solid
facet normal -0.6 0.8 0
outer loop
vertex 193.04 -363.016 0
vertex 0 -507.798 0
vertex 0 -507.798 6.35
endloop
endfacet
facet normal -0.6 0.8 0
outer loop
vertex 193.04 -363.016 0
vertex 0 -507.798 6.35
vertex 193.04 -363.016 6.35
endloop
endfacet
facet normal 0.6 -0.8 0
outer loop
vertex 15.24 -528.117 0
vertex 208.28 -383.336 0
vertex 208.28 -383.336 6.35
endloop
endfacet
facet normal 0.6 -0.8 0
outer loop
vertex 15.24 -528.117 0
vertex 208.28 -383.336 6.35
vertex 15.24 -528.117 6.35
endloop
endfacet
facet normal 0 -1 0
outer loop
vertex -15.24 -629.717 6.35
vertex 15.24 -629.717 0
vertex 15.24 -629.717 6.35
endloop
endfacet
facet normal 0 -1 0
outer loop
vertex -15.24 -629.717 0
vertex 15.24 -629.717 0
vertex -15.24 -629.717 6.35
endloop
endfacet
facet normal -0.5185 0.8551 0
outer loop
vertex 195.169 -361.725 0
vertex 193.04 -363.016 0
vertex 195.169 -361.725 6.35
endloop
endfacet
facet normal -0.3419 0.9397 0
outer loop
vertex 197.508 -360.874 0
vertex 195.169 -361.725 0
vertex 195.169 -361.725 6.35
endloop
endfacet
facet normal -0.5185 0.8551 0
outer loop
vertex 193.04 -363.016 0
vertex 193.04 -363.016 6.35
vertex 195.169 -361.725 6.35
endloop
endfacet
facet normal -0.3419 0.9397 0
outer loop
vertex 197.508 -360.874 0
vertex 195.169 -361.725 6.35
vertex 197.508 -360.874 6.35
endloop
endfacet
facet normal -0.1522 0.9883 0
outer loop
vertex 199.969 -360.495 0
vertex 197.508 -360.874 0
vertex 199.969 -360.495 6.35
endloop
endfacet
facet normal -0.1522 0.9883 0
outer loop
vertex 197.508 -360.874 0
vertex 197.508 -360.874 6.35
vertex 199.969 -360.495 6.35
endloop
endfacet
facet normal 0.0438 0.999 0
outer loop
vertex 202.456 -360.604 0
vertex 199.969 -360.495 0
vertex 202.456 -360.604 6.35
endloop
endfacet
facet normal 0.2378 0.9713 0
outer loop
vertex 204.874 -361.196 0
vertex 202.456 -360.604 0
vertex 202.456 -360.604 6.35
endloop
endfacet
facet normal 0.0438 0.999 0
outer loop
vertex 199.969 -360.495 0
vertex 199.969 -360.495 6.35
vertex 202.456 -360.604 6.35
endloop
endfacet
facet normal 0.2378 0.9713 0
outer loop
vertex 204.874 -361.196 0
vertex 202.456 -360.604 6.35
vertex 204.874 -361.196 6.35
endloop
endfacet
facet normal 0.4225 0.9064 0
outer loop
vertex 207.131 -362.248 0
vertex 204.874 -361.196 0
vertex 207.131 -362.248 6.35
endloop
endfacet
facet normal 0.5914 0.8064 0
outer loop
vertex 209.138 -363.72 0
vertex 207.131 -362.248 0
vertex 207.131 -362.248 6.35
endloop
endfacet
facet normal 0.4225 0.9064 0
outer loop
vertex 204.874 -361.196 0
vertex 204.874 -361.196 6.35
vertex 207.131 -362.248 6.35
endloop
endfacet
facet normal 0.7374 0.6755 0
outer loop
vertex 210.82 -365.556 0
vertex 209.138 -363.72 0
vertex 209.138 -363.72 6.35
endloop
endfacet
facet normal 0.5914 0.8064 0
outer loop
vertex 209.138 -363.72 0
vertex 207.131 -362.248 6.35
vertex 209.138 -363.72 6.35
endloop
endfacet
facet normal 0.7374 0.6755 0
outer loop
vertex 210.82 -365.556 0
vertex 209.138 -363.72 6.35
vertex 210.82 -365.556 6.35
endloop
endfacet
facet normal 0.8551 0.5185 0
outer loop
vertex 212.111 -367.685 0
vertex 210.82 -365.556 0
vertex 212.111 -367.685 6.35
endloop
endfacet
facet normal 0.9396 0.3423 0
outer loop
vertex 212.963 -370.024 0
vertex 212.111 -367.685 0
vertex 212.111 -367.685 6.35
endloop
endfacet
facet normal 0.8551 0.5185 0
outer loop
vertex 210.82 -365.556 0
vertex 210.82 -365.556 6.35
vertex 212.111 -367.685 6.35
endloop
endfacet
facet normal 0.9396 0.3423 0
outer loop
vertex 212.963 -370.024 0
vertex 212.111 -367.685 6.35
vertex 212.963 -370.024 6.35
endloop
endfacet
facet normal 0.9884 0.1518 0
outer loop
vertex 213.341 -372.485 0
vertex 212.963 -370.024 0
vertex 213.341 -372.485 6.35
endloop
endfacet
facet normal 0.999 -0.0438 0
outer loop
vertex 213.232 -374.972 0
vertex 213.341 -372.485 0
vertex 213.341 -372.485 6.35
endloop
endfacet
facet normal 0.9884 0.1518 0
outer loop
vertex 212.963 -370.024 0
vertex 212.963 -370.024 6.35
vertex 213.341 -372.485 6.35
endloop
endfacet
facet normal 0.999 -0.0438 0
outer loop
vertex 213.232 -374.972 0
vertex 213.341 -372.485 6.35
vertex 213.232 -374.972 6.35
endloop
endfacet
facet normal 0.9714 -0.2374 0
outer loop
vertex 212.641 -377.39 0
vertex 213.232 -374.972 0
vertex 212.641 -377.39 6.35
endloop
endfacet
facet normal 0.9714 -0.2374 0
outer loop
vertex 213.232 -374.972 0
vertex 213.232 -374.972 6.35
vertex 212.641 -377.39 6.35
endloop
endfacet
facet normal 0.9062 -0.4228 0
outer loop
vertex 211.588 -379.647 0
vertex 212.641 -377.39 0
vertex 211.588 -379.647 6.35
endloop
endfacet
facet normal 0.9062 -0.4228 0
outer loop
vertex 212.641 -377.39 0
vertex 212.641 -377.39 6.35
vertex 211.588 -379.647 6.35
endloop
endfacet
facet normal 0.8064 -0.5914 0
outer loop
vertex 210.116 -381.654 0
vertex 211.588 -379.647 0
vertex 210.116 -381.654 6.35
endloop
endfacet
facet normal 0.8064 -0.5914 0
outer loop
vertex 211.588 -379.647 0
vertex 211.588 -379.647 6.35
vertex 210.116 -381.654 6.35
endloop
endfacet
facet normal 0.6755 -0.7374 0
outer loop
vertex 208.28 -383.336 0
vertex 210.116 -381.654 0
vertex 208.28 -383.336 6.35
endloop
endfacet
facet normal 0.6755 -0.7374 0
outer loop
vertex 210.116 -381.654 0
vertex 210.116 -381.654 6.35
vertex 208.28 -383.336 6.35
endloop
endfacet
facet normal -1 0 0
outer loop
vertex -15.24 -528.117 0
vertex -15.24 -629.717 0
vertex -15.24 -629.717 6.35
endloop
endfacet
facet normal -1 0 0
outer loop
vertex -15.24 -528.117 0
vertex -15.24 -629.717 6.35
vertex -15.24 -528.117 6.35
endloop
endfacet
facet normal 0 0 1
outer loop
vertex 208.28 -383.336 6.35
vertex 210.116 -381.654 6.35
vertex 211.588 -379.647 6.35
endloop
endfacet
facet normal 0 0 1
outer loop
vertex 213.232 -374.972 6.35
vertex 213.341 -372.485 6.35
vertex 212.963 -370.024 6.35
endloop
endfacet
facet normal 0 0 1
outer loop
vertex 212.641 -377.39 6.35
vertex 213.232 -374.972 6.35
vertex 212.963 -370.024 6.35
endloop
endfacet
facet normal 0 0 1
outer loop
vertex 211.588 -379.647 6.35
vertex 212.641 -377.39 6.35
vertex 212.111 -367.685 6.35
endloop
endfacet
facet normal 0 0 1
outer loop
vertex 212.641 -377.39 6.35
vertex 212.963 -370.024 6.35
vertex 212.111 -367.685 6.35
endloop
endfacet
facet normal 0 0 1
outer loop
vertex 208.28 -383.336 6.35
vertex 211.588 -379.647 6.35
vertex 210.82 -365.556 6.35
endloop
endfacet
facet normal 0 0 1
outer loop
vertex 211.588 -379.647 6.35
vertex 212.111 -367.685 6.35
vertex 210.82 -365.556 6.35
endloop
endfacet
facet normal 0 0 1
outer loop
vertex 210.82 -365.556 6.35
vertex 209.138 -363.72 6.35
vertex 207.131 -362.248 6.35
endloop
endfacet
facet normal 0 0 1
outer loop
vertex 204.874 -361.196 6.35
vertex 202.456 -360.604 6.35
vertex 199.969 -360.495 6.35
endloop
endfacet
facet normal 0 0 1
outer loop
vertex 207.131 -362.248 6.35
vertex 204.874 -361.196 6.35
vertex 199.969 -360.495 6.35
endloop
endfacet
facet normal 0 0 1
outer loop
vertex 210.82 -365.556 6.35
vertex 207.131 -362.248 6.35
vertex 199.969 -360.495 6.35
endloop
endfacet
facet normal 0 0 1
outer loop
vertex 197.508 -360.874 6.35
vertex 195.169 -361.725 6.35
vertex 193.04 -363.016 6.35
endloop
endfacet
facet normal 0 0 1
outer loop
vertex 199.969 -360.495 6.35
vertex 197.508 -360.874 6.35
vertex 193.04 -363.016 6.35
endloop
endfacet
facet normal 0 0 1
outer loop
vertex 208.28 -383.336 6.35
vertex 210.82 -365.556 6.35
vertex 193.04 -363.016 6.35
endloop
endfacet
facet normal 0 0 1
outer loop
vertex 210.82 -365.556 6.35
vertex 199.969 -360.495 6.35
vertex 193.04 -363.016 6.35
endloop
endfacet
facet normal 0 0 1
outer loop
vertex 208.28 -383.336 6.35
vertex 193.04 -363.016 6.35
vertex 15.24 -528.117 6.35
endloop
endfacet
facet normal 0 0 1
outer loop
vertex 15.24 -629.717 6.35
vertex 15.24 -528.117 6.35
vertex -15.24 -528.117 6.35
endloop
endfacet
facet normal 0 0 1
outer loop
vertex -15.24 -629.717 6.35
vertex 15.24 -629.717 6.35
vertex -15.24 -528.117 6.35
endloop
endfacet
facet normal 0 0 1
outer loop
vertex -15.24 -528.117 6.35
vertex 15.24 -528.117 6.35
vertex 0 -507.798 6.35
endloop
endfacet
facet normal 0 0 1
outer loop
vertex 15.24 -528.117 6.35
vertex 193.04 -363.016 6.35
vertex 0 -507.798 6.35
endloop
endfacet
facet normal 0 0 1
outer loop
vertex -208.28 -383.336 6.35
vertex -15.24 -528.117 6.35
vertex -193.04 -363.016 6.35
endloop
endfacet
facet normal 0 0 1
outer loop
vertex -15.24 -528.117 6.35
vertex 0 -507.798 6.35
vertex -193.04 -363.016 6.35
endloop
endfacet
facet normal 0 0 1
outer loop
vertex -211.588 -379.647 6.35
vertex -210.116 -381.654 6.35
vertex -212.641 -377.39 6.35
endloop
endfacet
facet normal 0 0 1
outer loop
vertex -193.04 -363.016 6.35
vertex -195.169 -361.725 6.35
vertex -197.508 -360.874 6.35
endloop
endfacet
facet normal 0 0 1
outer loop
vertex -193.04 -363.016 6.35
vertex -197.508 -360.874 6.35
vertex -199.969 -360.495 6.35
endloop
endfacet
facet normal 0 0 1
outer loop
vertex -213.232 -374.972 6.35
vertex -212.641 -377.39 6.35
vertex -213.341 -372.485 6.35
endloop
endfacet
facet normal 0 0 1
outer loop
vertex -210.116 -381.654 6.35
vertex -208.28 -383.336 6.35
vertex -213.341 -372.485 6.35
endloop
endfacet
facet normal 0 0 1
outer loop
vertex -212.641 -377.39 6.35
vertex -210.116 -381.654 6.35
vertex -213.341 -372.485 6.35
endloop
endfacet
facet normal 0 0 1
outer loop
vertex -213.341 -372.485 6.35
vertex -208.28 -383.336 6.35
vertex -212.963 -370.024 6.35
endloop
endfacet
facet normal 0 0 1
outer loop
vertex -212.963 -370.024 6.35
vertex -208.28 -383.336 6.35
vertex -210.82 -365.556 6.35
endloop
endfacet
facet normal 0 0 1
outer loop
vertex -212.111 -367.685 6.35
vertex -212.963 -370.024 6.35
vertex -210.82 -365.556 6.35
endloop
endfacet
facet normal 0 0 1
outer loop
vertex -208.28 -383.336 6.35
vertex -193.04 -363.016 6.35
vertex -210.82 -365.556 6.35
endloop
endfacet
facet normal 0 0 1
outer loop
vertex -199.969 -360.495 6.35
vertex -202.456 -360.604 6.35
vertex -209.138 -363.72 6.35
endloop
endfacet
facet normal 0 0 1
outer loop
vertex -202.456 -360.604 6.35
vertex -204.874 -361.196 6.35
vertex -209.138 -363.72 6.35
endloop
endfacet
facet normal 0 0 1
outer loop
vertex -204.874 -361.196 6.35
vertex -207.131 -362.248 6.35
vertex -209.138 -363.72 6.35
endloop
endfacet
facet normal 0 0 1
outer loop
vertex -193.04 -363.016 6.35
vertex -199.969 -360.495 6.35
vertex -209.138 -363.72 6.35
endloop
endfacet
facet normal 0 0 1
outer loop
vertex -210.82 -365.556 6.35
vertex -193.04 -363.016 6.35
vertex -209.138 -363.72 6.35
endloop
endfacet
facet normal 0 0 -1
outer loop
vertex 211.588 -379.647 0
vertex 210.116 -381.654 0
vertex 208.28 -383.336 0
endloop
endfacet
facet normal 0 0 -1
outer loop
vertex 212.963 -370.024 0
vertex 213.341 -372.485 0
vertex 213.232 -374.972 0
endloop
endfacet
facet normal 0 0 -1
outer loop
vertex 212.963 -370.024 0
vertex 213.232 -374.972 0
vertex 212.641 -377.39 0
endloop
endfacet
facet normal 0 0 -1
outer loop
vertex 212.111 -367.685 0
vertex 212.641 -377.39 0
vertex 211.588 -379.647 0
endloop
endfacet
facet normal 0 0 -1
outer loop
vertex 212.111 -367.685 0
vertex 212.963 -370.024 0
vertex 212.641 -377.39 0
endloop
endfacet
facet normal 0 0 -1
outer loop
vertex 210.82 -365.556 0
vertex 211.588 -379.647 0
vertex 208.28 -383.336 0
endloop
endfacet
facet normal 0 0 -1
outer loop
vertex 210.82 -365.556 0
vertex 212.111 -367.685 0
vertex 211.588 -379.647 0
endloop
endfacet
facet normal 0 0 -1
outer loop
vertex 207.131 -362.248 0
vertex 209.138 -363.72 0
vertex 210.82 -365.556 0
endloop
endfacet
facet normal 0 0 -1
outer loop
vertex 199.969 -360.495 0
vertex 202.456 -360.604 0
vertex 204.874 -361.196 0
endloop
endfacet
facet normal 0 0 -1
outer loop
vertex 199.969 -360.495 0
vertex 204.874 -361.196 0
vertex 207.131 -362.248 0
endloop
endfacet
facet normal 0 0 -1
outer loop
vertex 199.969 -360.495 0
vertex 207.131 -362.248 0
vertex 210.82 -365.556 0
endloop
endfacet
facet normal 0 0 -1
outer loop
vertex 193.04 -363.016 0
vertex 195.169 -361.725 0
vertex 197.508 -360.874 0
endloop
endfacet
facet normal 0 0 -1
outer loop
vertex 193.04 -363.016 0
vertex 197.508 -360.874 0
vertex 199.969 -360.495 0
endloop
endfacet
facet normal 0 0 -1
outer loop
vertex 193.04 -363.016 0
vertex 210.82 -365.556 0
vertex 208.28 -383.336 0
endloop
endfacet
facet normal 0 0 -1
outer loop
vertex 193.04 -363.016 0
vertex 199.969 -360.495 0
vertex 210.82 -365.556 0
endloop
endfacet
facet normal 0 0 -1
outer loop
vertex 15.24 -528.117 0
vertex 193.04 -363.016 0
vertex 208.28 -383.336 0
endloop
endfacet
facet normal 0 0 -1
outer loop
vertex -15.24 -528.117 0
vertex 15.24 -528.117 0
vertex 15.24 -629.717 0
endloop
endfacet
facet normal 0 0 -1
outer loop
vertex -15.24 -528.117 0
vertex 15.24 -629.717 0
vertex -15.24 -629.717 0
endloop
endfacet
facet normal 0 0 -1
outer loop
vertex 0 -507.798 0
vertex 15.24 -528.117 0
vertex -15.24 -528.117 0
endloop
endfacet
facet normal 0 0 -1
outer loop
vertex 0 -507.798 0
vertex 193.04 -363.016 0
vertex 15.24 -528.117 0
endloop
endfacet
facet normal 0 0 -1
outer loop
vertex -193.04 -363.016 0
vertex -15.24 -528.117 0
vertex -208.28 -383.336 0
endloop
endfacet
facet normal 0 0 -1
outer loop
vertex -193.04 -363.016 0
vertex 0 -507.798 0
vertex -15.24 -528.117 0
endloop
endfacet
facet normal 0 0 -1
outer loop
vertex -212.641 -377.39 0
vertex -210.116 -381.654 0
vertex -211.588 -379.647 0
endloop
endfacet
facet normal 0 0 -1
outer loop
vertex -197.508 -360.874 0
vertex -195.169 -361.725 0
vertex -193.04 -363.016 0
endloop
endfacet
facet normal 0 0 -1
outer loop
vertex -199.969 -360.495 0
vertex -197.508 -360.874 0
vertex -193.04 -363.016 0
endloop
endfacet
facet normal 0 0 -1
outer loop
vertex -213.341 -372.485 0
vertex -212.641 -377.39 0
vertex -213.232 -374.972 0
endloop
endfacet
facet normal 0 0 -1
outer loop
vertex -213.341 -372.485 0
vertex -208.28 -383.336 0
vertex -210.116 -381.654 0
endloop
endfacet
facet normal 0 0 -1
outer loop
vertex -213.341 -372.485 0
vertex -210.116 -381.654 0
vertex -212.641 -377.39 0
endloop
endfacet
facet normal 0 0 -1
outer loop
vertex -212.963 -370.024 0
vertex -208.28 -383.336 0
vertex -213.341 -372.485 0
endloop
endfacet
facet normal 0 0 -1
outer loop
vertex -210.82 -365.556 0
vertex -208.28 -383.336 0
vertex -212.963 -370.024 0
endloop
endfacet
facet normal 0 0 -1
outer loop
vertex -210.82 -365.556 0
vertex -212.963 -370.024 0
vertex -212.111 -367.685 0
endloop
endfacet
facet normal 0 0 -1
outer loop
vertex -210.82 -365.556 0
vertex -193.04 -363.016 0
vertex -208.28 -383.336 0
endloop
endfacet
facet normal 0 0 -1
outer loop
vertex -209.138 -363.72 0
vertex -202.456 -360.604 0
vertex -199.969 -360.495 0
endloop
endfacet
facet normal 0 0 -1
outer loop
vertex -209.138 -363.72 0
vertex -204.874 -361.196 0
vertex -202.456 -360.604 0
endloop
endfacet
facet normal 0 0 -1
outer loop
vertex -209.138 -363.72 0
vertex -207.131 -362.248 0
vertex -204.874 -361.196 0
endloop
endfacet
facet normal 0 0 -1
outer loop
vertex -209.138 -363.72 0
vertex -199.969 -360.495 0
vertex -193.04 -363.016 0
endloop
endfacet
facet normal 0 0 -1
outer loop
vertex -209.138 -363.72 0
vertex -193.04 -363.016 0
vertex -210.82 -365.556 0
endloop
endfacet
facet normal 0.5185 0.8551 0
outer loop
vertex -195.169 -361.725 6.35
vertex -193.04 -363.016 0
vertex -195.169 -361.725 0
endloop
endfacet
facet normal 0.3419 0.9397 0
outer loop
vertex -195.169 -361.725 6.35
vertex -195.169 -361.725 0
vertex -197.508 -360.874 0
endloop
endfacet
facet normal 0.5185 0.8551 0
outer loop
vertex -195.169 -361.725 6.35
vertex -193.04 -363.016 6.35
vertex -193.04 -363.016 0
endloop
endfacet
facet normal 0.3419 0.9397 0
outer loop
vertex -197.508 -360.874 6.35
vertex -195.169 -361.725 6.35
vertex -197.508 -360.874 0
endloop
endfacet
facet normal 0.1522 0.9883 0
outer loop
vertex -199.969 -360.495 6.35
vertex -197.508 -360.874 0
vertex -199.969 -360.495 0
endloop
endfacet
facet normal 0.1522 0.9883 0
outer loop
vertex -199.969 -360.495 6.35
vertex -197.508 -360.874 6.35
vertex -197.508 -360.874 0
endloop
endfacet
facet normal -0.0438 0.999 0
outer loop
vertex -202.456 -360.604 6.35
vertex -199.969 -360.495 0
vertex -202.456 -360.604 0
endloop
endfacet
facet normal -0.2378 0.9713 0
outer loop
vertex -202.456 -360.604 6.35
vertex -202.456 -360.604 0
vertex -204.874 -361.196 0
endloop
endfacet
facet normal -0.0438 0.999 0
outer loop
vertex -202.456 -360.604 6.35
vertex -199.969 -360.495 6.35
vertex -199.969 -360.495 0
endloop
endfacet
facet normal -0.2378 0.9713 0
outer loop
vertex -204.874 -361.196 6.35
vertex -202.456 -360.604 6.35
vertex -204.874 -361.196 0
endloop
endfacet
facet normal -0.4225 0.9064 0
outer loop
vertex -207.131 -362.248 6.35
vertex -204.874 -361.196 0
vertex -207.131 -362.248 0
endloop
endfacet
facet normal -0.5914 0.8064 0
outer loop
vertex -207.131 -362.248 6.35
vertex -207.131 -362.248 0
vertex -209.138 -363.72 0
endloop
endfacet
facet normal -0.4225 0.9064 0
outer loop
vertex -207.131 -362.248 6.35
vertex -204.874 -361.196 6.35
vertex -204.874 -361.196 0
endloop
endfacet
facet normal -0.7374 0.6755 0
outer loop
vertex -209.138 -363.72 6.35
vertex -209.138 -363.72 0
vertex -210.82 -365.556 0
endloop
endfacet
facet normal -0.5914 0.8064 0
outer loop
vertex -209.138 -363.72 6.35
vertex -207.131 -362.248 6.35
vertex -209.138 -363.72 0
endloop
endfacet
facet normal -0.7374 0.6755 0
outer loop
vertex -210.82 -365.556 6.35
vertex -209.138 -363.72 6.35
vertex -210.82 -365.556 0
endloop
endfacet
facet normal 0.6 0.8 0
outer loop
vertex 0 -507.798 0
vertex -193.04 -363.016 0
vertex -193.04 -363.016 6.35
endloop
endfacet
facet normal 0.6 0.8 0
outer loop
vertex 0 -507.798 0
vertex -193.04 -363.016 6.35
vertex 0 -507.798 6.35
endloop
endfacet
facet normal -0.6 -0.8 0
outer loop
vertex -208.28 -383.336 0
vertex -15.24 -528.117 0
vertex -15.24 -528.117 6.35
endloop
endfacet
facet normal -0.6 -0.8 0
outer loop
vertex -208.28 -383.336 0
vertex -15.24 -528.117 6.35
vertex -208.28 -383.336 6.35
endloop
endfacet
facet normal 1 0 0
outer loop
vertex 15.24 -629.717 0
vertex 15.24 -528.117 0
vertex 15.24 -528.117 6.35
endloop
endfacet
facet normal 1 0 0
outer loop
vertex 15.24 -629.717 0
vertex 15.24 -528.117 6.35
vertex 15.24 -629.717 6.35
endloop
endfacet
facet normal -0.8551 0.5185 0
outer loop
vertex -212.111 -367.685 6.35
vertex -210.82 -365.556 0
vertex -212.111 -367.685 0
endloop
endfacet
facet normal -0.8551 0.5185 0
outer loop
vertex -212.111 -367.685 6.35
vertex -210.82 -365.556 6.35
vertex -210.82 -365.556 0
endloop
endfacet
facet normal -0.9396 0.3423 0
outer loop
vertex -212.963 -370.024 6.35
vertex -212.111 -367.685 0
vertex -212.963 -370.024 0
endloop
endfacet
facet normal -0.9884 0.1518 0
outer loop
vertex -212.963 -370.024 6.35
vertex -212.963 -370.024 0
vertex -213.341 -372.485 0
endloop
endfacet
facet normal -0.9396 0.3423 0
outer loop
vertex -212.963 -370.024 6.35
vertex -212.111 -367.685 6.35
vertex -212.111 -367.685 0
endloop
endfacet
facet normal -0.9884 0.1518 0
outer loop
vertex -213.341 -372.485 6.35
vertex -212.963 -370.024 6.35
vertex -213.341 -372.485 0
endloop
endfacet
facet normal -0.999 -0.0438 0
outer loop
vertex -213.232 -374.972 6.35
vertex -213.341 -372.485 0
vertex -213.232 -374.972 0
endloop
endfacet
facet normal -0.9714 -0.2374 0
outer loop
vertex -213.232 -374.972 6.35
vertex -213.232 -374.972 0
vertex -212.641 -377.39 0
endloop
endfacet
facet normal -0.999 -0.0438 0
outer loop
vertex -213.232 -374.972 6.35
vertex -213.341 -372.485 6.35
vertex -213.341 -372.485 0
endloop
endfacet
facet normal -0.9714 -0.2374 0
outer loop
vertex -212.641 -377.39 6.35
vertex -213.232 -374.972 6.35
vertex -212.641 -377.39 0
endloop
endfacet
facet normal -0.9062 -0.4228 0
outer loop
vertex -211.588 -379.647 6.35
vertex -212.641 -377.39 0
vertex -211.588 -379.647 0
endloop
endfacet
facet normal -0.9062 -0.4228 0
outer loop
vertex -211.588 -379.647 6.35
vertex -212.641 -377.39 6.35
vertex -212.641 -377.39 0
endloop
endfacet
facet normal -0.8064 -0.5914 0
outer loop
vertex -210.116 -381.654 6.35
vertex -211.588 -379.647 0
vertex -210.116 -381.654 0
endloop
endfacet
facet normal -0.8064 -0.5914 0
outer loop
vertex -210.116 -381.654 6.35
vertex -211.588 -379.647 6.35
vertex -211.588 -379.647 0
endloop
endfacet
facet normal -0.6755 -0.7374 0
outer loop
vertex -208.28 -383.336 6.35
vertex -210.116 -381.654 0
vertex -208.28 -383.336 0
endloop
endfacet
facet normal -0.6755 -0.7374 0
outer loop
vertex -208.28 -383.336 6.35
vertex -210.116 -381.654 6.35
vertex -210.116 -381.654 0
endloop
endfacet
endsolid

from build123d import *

# Parameters (mm, degrees)
BOSS_EXTRUDE2_DEPTH = 6.35
FILLET1_R           = 12.7
FILLET2_R           = 12.7
FILLET3_R           = 12.7
FILLET4_R           = 12.7


with BuildPart() as part:
    # Sketch6 → Boss-Extrude2 (new body)
    with BuildSketch(Plane.XY):
        Polygon((-203.2, -355.396143874), (0, -507.797500764), (203.2, -355.396143874), (218.440086841, -375.716078743), (15.240086841, -528.117435634), (15.240086841, -629.717435634), (-15.240086841, -629.717435634), (-15.240086841, -528.117435634), (-218.440086841, -375.716078743), align=None)
    extrude(amount=BOSS_EXTRUDE2_DEPTH)

    # Fillet1
    fillet1_edges = [part.edges().sort_by_distance(p)[0] for p in [
        (203.2, -355.396143874, 3.175),
    ]]
    fillet(fillet1_edges, radius=FILLET1_R)

    # Fillet2
    fillet2_edges = [part.edges().sort_by_distance(p)[0] for p in [
        (218.440086841, -375.716078743, 3.175),
    ]]
    fillet(fillet2_edges, radius=FILLET2_R - 0.0001)  # a hair under: the kernel refuses the full size

    # Fillet3
    fillet3_edges = [part.edges().sort_by_distance(p)[0] for p in [
        (-203.2, -355.396143874, 3.175),
    ]]
    fillet(fillet3_edges, radius=FILLET3_R)

    # Fillet4
    fillet4_edges = [part.edges().sort_by_distance(p)[0] for p in [
        (-218.440086841, -375.716078743, 3.175),
    ]]
    fillet(fillet4_edges, radius=FILLET4_R - 0.0001)  # a hair under: the kernel refuses the full size


solid = part.part
